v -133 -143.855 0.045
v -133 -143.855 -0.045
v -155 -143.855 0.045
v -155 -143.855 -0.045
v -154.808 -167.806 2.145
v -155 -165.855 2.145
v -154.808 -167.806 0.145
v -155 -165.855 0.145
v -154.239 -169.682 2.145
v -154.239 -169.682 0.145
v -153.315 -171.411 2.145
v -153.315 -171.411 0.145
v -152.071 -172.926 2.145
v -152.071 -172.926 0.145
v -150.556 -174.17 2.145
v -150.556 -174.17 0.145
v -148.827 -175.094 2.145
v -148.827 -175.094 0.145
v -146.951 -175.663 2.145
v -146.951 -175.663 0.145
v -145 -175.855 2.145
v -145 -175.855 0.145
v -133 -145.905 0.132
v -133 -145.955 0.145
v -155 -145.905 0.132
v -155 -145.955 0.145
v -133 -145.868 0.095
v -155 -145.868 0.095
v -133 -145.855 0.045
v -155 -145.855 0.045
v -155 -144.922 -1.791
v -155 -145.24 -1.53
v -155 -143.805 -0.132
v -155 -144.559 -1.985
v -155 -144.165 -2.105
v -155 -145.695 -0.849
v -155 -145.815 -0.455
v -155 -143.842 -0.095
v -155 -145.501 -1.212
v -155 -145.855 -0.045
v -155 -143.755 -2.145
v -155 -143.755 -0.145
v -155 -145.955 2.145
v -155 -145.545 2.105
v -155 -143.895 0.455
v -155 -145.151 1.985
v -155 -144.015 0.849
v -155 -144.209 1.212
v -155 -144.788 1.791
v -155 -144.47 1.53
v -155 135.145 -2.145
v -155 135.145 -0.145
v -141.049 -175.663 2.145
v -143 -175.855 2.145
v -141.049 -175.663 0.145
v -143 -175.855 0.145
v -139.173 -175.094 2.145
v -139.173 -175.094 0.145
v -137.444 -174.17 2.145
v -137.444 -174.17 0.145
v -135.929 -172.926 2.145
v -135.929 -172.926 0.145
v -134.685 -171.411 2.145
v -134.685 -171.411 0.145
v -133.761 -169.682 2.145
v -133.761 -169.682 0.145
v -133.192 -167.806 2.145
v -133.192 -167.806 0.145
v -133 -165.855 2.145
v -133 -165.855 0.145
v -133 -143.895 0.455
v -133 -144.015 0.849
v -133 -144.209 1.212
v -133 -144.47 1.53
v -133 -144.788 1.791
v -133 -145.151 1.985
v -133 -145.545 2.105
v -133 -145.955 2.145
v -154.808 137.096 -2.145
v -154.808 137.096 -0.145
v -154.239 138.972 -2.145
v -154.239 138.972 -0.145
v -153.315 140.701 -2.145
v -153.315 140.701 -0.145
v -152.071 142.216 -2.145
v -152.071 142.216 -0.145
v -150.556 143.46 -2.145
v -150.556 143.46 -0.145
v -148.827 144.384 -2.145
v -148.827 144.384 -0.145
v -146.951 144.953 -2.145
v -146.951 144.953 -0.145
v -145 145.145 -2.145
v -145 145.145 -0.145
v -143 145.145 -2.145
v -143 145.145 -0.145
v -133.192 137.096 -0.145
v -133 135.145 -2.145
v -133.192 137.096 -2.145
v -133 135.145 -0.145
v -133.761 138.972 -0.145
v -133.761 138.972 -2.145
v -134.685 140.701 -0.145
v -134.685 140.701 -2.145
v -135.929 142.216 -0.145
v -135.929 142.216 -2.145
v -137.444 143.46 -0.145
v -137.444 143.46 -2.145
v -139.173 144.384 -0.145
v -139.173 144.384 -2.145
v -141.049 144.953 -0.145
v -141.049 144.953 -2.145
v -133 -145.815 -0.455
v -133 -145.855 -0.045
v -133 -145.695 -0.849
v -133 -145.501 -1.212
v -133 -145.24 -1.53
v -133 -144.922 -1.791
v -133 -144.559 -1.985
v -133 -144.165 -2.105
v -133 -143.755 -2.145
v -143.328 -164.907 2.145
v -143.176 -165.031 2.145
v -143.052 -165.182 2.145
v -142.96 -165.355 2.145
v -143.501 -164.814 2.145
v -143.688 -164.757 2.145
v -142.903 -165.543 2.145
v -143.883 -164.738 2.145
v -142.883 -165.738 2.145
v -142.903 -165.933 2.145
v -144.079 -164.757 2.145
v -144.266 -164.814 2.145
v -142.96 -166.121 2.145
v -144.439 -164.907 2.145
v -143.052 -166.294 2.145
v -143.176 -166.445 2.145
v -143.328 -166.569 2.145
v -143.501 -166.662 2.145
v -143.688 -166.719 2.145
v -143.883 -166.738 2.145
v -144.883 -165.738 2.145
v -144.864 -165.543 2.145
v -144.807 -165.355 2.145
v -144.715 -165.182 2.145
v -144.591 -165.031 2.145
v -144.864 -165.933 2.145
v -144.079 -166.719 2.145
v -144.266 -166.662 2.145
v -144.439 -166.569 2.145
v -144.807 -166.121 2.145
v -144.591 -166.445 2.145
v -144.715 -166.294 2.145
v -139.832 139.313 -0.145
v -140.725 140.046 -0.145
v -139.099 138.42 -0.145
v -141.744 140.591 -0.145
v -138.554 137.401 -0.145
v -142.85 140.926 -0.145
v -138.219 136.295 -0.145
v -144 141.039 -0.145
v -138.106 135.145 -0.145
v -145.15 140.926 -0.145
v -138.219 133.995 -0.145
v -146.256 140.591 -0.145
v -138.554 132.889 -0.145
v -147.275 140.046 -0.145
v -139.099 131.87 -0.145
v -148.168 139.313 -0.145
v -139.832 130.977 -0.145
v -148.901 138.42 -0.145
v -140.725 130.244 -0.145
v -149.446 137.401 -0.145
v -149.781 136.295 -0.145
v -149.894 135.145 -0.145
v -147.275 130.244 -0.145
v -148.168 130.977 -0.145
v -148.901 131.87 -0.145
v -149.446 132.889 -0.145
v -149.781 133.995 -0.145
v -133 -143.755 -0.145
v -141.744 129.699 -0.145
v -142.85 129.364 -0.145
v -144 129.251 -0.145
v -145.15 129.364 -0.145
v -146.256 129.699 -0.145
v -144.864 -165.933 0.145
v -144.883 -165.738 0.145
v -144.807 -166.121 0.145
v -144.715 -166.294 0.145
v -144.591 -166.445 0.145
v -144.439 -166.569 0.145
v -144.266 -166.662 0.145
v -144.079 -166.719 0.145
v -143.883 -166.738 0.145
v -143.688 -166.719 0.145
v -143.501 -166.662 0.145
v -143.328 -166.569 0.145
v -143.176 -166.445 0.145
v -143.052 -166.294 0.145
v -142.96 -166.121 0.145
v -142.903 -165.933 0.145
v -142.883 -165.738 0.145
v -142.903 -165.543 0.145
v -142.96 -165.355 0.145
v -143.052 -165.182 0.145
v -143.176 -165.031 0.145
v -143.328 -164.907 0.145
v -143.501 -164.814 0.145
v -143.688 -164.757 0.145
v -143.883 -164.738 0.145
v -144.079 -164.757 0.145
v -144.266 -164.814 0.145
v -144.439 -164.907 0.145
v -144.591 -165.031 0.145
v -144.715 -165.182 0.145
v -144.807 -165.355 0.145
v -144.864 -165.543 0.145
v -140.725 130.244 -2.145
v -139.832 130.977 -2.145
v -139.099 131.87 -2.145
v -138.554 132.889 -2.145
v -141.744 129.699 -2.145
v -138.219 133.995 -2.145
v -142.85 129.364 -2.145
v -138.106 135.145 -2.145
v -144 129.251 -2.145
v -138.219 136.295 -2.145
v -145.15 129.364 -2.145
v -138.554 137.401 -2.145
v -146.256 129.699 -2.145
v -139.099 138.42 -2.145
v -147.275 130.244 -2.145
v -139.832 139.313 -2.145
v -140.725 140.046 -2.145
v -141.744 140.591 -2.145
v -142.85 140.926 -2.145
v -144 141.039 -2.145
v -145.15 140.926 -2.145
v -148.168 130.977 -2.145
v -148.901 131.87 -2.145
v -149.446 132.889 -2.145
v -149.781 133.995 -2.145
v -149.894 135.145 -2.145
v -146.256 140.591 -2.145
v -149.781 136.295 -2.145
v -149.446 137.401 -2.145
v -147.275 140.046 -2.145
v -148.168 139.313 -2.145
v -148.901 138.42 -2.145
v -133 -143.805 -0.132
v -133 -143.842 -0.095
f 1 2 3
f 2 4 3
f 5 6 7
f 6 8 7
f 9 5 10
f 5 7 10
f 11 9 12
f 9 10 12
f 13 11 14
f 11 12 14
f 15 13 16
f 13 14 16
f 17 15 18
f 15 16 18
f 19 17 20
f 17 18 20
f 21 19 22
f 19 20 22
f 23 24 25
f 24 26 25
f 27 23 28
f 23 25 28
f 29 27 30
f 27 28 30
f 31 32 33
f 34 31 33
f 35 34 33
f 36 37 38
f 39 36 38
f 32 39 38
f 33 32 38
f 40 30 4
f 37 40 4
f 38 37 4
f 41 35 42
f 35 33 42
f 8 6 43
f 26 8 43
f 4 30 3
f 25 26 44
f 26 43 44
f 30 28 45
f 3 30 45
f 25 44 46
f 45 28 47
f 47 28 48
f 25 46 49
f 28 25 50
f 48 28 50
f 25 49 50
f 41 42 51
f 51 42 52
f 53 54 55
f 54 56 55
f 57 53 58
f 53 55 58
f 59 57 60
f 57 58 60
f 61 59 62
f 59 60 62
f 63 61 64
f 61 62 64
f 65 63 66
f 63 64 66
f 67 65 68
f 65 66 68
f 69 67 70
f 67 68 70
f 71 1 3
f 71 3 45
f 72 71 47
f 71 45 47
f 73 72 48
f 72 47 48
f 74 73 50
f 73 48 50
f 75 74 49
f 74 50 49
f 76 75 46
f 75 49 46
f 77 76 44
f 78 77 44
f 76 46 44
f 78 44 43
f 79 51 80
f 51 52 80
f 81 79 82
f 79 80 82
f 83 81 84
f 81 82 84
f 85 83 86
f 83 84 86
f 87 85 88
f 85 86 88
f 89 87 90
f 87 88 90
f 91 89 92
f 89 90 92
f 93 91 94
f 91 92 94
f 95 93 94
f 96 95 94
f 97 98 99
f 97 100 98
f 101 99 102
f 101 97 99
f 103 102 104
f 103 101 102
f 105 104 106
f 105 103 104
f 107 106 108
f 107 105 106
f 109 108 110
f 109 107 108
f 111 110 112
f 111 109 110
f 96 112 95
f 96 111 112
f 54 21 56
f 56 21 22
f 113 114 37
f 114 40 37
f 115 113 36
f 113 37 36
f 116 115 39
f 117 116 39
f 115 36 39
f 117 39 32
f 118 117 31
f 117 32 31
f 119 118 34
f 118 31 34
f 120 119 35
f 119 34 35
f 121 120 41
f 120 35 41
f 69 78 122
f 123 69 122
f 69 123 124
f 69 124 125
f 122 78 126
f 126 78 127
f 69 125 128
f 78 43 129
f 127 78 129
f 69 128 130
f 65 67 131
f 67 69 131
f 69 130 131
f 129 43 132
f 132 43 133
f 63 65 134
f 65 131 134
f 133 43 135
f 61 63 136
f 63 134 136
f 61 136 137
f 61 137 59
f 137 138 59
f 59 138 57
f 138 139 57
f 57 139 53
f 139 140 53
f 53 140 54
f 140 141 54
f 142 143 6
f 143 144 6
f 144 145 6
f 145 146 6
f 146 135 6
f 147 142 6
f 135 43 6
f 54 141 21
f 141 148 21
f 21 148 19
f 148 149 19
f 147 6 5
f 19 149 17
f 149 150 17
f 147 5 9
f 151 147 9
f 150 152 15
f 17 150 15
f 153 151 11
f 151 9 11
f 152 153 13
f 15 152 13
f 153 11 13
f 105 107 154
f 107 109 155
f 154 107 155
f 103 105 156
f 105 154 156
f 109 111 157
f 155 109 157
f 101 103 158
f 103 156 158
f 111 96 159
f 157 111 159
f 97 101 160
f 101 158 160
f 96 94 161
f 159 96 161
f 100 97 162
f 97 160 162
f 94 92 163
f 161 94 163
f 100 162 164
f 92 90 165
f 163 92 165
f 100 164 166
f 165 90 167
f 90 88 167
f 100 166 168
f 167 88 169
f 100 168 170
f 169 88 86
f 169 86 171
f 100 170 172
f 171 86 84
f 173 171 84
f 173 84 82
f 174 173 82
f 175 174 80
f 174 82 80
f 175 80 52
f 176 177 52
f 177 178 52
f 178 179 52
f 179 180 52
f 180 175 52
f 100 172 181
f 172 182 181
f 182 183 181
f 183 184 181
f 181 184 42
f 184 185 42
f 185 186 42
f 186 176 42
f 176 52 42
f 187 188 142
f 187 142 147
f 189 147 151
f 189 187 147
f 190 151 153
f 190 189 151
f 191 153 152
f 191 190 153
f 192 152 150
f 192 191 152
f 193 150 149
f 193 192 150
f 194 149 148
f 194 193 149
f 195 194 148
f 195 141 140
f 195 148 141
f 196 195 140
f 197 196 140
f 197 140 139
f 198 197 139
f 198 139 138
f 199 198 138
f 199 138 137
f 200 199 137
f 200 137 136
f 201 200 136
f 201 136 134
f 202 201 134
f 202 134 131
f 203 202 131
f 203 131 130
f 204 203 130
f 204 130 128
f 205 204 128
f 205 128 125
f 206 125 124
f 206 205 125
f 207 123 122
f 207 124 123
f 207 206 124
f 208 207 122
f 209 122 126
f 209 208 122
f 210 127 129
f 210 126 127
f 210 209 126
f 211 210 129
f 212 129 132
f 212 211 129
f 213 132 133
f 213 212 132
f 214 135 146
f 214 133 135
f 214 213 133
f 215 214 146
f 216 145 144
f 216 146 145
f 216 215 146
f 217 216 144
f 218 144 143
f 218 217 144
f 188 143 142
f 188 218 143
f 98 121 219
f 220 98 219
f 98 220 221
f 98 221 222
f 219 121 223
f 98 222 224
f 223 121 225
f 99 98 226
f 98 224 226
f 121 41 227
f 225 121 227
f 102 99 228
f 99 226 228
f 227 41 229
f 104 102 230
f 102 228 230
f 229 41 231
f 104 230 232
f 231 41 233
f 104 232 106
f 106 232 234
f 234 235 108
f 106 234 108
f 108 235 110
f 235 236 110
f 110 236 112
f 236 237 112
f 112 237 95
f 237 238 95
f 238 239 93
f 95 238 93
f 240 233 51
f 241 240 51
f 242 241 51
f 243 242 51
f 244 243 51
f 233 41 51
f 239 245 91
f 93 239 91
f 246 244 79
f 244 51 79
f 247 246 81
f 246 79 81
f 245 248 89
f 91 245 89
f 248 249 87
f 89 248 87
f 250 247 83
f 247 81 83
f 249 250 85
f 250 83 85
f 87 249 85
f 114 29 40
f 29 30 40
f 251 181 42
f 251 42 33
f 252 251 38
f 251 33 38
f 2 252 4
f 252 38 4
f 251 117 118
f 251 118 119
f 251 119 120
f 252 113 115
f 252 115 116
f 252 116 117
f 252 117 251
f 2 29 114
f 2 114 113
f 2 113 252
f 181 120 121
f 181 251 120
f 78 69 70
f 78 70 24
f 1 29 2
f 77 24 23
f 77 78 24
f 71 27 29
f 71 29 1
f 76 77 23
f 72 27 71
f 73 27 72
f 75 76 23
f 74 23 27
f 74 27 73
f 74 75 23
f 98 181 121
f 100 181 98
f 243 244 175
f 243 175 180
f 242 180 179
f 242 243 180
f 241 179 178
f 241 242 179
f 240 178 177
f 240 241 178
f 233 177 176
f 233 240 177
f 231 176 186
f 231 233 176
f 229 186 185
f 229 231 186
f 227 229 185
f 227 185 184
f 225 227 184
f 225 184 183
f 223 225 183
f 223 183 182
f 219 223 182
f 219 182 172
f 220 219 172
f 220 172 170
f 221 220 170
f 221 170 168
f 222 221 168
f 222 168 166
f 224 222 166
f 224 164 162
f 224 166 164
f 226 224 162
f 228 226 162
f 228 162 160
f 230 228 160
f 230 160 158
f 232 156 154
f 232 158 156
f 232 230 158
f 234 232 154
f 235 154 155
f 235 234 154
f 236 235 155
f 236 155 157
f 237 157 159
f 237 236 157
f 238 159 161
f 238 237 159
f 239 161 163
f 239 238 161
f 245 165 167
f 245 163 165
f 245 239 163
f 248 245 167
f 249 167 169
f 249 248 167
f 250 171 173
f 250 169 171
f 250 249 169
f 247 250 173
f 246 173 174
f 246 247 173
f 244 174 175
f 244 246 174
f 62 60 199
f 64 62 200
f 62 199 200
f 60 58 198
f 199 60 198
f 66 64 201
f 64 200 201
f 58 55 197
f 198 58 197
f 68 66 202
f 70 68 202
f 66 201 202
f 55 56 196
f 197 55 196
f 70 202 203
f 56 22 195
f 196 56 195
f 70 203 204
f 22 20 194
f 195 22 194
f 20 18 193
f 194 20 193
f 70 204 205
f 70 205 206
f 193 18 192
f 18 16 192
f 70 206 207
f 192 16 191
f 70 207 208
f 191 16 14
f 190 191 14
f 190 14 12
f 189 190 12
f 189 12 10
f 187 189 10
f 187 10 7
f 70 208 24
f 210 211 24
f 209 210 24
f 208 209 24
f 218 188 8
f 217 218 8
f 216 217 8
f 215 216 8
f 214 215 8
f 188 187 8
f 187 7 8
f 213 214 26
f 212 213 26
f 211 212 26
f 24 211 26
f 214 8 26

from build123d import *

# Parameters (mm, degrees)
BASE_FLANGE1_DEPTH      = 11
FILLET1_R               = 10
CUT_EXTRUDE1_DEPTH      = 290.218332925
CUT_EXTRUDE1_DEPTH_BACK = 290.218332925
SKETCH7_R               = 5.894184215
SKETCH7_R_2             = 1
BODY_MOVE_COPY1_ANGLE   = 120


# Sheet-metal steps are written as plain solids
with BuildPart() as part:
    # Sketch2 → Base-Flange1 (new, symmetric)
    with BuildSketch(Plane.XY):
        with BuildLine():
            Line((-289, 0), (-0.1, 0))
            ThreePointArc((-0.1, 0), (-0.029289322, 0.029289322), (0, 0.1))
            Line((0, 0.1), (0, 0.19))
            ThreePointArc((0, 0.19), (0.61507576, 1.67492424), (2.1, 2.29))
            Line((2.1, 2.29), (32, 2.29))
            Line((32, 2.29), (32, 0.29))
            Line((32, 0.29), (2.1, 0.29))
            ThreePointArc((2.1, 0.29), (2.029289322, 0.260710678), (2, 0.19))
            Line((2, 0.19), (2, 0.1))
            ThreePointArc((2, 0.1), (1.38492424, -1.38492424), (-0.1, -2))
            Line((-0.1, -2), (-289, -2))
            Line((-289, -2), (-289, 0))
        make_face()
    extrude(amount=BASE_FLANGE1_DEPTH, both=True)

    # Fillet1
    fillet1_edges = [part.edges().sort_by_distance(p)[0] for p in [
        (-289, -1, -11),
        (32, 1.29, -11),
        (-289, -1, 11),
        (32, 1.29, 11),
    ]]
    fillet(fillet1_edges, radius=FILLET1_R)

    # Sketch7 → Cut-Extrude1 (cut, two sides: drawn at the far end of the back side and taken through both)
    with BuildSketch(Plane(origin=(0, 0, 0), x_dir=(1, 0, 0), z_dir=(0, 1, 0)).offset(-CUT_EXTRUDE1_DEPTH_BACK)):
        with Locations(Location((-279, 0, 0), (0, 0, 270))):
            Circle(SKETCH7_R)
        with Locations(Location((21.883026743, 0.116566496, 0), (0, 0, 270))):
            Circle(SKETCH7_R_2)
    extrude(amount=CUT_EXTRUDE1_DEPTH + CUT_EXTRUDE1_DEPTH_BACK, mode=Mode.SUBTRACT)


with BuildPart() as part_1:
    # Body-Move/Copy1: moved
    add(part.part.moved(Location((0, 0, 0))).rotate(Axis((-95.951666667, -47.903333333, -48.048333333), (0.5773502691899637, -0.5773502691896031, -0.5773502691893106)), BODY_MOVE_COPY1_ANGLE))


solid = part_1.part
